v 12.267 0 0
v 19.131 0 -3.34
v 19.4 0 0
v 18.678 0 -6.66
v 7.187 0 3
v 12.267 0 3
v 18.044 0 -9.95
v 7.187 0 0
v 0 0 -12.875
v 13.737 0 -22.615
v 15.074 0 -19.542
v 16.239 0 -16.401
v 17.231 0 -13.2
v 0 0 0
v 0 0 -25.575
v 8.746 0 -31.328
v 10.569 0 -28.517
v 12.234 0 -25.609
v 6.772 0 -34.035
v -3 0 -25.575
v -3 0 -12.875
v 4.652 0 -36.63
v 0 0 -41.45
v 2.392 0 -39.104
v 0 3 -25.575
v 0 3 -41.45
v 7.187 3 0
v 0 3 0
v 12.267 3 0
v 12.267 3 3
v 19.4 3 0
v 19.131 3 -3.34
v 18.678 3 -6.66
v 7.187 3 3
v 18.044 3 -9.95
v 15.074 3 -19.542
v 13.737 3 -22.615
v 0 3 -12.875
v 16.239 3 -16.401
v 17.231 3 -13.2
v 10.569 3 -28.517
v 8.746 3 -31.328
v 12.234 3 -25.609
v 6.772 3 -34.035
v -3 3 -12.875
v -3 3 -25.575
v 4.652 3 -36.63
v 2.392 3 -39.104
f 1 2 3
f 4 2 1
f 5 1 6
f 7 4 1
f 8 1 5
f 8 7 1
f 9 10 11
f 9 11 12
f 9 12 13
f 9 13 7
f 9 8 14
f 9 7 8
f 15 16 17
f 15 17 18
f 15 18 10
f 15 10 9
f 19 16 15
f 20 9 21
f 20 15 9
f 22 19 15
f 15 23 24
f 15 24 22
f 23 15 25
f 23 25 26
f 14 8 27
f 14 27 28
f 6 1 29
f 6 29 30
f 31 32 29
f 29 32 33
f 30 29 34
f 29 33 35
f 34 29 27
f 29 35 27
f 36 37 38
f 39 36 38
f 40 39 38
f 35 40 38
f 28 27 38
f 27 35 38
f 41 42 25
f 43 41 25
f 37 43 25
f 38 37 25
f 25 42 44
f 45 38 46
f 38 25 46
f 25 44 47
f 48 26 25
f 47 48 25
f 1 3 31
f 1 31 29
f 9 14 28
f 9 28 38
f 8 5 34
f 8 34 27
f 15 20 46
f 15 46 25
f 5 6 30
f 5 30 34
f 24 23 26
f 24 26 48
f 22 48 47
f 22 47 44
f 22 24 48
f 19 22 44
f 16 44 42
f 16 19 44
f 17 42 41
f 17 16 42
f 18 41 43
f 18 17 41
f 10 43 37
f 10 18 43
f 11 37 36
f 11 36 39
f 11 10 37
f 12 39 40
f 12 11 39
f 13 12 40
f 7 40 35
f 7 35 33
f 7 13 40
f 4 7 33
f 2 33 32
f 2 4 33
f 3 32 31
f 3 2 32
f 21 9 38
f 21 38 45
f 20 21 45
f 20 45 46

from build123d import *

# Parameters (mm, degrees)
BOSS_EXTRUDE1_DEPTH = 3


with BuildPart() as part:
    # Sketch2 → Boss-Extrude1 (new body)
    with BuildSketch(Plane(origin=(0, 0, 0), x_dir=(1, 0, 0), z_dir=(0, 1, 0))):
        with BuildLine():
            Line((0, 0), (0, 12.875))
            Line((0, 12.875), (-3, 12.875))
            Line((-3, 12.875), (-3, 25.575))
            Line((-3, 25.575), (0, 25.575))
            Line((0, 25.575), (0, 41.45))
            ThreePointArc((0, 41.45), (13.737406392, 22.614642557), (19.4, 0))
            Line((19.4, 0), (12.266745701, 0))
            Line((12.266745701, 0), (12.266745701, -3))
            Line((12.266745701, -3), (7.186745701, -3))
            Line((7.186745701, -3), (7.186745701, 0))
            Line((7.186745701, 0), (0, 0))
        make_face()
    extrude(amount=BOSS_EXTRUDE1_DEPTH)


solid = part.part
